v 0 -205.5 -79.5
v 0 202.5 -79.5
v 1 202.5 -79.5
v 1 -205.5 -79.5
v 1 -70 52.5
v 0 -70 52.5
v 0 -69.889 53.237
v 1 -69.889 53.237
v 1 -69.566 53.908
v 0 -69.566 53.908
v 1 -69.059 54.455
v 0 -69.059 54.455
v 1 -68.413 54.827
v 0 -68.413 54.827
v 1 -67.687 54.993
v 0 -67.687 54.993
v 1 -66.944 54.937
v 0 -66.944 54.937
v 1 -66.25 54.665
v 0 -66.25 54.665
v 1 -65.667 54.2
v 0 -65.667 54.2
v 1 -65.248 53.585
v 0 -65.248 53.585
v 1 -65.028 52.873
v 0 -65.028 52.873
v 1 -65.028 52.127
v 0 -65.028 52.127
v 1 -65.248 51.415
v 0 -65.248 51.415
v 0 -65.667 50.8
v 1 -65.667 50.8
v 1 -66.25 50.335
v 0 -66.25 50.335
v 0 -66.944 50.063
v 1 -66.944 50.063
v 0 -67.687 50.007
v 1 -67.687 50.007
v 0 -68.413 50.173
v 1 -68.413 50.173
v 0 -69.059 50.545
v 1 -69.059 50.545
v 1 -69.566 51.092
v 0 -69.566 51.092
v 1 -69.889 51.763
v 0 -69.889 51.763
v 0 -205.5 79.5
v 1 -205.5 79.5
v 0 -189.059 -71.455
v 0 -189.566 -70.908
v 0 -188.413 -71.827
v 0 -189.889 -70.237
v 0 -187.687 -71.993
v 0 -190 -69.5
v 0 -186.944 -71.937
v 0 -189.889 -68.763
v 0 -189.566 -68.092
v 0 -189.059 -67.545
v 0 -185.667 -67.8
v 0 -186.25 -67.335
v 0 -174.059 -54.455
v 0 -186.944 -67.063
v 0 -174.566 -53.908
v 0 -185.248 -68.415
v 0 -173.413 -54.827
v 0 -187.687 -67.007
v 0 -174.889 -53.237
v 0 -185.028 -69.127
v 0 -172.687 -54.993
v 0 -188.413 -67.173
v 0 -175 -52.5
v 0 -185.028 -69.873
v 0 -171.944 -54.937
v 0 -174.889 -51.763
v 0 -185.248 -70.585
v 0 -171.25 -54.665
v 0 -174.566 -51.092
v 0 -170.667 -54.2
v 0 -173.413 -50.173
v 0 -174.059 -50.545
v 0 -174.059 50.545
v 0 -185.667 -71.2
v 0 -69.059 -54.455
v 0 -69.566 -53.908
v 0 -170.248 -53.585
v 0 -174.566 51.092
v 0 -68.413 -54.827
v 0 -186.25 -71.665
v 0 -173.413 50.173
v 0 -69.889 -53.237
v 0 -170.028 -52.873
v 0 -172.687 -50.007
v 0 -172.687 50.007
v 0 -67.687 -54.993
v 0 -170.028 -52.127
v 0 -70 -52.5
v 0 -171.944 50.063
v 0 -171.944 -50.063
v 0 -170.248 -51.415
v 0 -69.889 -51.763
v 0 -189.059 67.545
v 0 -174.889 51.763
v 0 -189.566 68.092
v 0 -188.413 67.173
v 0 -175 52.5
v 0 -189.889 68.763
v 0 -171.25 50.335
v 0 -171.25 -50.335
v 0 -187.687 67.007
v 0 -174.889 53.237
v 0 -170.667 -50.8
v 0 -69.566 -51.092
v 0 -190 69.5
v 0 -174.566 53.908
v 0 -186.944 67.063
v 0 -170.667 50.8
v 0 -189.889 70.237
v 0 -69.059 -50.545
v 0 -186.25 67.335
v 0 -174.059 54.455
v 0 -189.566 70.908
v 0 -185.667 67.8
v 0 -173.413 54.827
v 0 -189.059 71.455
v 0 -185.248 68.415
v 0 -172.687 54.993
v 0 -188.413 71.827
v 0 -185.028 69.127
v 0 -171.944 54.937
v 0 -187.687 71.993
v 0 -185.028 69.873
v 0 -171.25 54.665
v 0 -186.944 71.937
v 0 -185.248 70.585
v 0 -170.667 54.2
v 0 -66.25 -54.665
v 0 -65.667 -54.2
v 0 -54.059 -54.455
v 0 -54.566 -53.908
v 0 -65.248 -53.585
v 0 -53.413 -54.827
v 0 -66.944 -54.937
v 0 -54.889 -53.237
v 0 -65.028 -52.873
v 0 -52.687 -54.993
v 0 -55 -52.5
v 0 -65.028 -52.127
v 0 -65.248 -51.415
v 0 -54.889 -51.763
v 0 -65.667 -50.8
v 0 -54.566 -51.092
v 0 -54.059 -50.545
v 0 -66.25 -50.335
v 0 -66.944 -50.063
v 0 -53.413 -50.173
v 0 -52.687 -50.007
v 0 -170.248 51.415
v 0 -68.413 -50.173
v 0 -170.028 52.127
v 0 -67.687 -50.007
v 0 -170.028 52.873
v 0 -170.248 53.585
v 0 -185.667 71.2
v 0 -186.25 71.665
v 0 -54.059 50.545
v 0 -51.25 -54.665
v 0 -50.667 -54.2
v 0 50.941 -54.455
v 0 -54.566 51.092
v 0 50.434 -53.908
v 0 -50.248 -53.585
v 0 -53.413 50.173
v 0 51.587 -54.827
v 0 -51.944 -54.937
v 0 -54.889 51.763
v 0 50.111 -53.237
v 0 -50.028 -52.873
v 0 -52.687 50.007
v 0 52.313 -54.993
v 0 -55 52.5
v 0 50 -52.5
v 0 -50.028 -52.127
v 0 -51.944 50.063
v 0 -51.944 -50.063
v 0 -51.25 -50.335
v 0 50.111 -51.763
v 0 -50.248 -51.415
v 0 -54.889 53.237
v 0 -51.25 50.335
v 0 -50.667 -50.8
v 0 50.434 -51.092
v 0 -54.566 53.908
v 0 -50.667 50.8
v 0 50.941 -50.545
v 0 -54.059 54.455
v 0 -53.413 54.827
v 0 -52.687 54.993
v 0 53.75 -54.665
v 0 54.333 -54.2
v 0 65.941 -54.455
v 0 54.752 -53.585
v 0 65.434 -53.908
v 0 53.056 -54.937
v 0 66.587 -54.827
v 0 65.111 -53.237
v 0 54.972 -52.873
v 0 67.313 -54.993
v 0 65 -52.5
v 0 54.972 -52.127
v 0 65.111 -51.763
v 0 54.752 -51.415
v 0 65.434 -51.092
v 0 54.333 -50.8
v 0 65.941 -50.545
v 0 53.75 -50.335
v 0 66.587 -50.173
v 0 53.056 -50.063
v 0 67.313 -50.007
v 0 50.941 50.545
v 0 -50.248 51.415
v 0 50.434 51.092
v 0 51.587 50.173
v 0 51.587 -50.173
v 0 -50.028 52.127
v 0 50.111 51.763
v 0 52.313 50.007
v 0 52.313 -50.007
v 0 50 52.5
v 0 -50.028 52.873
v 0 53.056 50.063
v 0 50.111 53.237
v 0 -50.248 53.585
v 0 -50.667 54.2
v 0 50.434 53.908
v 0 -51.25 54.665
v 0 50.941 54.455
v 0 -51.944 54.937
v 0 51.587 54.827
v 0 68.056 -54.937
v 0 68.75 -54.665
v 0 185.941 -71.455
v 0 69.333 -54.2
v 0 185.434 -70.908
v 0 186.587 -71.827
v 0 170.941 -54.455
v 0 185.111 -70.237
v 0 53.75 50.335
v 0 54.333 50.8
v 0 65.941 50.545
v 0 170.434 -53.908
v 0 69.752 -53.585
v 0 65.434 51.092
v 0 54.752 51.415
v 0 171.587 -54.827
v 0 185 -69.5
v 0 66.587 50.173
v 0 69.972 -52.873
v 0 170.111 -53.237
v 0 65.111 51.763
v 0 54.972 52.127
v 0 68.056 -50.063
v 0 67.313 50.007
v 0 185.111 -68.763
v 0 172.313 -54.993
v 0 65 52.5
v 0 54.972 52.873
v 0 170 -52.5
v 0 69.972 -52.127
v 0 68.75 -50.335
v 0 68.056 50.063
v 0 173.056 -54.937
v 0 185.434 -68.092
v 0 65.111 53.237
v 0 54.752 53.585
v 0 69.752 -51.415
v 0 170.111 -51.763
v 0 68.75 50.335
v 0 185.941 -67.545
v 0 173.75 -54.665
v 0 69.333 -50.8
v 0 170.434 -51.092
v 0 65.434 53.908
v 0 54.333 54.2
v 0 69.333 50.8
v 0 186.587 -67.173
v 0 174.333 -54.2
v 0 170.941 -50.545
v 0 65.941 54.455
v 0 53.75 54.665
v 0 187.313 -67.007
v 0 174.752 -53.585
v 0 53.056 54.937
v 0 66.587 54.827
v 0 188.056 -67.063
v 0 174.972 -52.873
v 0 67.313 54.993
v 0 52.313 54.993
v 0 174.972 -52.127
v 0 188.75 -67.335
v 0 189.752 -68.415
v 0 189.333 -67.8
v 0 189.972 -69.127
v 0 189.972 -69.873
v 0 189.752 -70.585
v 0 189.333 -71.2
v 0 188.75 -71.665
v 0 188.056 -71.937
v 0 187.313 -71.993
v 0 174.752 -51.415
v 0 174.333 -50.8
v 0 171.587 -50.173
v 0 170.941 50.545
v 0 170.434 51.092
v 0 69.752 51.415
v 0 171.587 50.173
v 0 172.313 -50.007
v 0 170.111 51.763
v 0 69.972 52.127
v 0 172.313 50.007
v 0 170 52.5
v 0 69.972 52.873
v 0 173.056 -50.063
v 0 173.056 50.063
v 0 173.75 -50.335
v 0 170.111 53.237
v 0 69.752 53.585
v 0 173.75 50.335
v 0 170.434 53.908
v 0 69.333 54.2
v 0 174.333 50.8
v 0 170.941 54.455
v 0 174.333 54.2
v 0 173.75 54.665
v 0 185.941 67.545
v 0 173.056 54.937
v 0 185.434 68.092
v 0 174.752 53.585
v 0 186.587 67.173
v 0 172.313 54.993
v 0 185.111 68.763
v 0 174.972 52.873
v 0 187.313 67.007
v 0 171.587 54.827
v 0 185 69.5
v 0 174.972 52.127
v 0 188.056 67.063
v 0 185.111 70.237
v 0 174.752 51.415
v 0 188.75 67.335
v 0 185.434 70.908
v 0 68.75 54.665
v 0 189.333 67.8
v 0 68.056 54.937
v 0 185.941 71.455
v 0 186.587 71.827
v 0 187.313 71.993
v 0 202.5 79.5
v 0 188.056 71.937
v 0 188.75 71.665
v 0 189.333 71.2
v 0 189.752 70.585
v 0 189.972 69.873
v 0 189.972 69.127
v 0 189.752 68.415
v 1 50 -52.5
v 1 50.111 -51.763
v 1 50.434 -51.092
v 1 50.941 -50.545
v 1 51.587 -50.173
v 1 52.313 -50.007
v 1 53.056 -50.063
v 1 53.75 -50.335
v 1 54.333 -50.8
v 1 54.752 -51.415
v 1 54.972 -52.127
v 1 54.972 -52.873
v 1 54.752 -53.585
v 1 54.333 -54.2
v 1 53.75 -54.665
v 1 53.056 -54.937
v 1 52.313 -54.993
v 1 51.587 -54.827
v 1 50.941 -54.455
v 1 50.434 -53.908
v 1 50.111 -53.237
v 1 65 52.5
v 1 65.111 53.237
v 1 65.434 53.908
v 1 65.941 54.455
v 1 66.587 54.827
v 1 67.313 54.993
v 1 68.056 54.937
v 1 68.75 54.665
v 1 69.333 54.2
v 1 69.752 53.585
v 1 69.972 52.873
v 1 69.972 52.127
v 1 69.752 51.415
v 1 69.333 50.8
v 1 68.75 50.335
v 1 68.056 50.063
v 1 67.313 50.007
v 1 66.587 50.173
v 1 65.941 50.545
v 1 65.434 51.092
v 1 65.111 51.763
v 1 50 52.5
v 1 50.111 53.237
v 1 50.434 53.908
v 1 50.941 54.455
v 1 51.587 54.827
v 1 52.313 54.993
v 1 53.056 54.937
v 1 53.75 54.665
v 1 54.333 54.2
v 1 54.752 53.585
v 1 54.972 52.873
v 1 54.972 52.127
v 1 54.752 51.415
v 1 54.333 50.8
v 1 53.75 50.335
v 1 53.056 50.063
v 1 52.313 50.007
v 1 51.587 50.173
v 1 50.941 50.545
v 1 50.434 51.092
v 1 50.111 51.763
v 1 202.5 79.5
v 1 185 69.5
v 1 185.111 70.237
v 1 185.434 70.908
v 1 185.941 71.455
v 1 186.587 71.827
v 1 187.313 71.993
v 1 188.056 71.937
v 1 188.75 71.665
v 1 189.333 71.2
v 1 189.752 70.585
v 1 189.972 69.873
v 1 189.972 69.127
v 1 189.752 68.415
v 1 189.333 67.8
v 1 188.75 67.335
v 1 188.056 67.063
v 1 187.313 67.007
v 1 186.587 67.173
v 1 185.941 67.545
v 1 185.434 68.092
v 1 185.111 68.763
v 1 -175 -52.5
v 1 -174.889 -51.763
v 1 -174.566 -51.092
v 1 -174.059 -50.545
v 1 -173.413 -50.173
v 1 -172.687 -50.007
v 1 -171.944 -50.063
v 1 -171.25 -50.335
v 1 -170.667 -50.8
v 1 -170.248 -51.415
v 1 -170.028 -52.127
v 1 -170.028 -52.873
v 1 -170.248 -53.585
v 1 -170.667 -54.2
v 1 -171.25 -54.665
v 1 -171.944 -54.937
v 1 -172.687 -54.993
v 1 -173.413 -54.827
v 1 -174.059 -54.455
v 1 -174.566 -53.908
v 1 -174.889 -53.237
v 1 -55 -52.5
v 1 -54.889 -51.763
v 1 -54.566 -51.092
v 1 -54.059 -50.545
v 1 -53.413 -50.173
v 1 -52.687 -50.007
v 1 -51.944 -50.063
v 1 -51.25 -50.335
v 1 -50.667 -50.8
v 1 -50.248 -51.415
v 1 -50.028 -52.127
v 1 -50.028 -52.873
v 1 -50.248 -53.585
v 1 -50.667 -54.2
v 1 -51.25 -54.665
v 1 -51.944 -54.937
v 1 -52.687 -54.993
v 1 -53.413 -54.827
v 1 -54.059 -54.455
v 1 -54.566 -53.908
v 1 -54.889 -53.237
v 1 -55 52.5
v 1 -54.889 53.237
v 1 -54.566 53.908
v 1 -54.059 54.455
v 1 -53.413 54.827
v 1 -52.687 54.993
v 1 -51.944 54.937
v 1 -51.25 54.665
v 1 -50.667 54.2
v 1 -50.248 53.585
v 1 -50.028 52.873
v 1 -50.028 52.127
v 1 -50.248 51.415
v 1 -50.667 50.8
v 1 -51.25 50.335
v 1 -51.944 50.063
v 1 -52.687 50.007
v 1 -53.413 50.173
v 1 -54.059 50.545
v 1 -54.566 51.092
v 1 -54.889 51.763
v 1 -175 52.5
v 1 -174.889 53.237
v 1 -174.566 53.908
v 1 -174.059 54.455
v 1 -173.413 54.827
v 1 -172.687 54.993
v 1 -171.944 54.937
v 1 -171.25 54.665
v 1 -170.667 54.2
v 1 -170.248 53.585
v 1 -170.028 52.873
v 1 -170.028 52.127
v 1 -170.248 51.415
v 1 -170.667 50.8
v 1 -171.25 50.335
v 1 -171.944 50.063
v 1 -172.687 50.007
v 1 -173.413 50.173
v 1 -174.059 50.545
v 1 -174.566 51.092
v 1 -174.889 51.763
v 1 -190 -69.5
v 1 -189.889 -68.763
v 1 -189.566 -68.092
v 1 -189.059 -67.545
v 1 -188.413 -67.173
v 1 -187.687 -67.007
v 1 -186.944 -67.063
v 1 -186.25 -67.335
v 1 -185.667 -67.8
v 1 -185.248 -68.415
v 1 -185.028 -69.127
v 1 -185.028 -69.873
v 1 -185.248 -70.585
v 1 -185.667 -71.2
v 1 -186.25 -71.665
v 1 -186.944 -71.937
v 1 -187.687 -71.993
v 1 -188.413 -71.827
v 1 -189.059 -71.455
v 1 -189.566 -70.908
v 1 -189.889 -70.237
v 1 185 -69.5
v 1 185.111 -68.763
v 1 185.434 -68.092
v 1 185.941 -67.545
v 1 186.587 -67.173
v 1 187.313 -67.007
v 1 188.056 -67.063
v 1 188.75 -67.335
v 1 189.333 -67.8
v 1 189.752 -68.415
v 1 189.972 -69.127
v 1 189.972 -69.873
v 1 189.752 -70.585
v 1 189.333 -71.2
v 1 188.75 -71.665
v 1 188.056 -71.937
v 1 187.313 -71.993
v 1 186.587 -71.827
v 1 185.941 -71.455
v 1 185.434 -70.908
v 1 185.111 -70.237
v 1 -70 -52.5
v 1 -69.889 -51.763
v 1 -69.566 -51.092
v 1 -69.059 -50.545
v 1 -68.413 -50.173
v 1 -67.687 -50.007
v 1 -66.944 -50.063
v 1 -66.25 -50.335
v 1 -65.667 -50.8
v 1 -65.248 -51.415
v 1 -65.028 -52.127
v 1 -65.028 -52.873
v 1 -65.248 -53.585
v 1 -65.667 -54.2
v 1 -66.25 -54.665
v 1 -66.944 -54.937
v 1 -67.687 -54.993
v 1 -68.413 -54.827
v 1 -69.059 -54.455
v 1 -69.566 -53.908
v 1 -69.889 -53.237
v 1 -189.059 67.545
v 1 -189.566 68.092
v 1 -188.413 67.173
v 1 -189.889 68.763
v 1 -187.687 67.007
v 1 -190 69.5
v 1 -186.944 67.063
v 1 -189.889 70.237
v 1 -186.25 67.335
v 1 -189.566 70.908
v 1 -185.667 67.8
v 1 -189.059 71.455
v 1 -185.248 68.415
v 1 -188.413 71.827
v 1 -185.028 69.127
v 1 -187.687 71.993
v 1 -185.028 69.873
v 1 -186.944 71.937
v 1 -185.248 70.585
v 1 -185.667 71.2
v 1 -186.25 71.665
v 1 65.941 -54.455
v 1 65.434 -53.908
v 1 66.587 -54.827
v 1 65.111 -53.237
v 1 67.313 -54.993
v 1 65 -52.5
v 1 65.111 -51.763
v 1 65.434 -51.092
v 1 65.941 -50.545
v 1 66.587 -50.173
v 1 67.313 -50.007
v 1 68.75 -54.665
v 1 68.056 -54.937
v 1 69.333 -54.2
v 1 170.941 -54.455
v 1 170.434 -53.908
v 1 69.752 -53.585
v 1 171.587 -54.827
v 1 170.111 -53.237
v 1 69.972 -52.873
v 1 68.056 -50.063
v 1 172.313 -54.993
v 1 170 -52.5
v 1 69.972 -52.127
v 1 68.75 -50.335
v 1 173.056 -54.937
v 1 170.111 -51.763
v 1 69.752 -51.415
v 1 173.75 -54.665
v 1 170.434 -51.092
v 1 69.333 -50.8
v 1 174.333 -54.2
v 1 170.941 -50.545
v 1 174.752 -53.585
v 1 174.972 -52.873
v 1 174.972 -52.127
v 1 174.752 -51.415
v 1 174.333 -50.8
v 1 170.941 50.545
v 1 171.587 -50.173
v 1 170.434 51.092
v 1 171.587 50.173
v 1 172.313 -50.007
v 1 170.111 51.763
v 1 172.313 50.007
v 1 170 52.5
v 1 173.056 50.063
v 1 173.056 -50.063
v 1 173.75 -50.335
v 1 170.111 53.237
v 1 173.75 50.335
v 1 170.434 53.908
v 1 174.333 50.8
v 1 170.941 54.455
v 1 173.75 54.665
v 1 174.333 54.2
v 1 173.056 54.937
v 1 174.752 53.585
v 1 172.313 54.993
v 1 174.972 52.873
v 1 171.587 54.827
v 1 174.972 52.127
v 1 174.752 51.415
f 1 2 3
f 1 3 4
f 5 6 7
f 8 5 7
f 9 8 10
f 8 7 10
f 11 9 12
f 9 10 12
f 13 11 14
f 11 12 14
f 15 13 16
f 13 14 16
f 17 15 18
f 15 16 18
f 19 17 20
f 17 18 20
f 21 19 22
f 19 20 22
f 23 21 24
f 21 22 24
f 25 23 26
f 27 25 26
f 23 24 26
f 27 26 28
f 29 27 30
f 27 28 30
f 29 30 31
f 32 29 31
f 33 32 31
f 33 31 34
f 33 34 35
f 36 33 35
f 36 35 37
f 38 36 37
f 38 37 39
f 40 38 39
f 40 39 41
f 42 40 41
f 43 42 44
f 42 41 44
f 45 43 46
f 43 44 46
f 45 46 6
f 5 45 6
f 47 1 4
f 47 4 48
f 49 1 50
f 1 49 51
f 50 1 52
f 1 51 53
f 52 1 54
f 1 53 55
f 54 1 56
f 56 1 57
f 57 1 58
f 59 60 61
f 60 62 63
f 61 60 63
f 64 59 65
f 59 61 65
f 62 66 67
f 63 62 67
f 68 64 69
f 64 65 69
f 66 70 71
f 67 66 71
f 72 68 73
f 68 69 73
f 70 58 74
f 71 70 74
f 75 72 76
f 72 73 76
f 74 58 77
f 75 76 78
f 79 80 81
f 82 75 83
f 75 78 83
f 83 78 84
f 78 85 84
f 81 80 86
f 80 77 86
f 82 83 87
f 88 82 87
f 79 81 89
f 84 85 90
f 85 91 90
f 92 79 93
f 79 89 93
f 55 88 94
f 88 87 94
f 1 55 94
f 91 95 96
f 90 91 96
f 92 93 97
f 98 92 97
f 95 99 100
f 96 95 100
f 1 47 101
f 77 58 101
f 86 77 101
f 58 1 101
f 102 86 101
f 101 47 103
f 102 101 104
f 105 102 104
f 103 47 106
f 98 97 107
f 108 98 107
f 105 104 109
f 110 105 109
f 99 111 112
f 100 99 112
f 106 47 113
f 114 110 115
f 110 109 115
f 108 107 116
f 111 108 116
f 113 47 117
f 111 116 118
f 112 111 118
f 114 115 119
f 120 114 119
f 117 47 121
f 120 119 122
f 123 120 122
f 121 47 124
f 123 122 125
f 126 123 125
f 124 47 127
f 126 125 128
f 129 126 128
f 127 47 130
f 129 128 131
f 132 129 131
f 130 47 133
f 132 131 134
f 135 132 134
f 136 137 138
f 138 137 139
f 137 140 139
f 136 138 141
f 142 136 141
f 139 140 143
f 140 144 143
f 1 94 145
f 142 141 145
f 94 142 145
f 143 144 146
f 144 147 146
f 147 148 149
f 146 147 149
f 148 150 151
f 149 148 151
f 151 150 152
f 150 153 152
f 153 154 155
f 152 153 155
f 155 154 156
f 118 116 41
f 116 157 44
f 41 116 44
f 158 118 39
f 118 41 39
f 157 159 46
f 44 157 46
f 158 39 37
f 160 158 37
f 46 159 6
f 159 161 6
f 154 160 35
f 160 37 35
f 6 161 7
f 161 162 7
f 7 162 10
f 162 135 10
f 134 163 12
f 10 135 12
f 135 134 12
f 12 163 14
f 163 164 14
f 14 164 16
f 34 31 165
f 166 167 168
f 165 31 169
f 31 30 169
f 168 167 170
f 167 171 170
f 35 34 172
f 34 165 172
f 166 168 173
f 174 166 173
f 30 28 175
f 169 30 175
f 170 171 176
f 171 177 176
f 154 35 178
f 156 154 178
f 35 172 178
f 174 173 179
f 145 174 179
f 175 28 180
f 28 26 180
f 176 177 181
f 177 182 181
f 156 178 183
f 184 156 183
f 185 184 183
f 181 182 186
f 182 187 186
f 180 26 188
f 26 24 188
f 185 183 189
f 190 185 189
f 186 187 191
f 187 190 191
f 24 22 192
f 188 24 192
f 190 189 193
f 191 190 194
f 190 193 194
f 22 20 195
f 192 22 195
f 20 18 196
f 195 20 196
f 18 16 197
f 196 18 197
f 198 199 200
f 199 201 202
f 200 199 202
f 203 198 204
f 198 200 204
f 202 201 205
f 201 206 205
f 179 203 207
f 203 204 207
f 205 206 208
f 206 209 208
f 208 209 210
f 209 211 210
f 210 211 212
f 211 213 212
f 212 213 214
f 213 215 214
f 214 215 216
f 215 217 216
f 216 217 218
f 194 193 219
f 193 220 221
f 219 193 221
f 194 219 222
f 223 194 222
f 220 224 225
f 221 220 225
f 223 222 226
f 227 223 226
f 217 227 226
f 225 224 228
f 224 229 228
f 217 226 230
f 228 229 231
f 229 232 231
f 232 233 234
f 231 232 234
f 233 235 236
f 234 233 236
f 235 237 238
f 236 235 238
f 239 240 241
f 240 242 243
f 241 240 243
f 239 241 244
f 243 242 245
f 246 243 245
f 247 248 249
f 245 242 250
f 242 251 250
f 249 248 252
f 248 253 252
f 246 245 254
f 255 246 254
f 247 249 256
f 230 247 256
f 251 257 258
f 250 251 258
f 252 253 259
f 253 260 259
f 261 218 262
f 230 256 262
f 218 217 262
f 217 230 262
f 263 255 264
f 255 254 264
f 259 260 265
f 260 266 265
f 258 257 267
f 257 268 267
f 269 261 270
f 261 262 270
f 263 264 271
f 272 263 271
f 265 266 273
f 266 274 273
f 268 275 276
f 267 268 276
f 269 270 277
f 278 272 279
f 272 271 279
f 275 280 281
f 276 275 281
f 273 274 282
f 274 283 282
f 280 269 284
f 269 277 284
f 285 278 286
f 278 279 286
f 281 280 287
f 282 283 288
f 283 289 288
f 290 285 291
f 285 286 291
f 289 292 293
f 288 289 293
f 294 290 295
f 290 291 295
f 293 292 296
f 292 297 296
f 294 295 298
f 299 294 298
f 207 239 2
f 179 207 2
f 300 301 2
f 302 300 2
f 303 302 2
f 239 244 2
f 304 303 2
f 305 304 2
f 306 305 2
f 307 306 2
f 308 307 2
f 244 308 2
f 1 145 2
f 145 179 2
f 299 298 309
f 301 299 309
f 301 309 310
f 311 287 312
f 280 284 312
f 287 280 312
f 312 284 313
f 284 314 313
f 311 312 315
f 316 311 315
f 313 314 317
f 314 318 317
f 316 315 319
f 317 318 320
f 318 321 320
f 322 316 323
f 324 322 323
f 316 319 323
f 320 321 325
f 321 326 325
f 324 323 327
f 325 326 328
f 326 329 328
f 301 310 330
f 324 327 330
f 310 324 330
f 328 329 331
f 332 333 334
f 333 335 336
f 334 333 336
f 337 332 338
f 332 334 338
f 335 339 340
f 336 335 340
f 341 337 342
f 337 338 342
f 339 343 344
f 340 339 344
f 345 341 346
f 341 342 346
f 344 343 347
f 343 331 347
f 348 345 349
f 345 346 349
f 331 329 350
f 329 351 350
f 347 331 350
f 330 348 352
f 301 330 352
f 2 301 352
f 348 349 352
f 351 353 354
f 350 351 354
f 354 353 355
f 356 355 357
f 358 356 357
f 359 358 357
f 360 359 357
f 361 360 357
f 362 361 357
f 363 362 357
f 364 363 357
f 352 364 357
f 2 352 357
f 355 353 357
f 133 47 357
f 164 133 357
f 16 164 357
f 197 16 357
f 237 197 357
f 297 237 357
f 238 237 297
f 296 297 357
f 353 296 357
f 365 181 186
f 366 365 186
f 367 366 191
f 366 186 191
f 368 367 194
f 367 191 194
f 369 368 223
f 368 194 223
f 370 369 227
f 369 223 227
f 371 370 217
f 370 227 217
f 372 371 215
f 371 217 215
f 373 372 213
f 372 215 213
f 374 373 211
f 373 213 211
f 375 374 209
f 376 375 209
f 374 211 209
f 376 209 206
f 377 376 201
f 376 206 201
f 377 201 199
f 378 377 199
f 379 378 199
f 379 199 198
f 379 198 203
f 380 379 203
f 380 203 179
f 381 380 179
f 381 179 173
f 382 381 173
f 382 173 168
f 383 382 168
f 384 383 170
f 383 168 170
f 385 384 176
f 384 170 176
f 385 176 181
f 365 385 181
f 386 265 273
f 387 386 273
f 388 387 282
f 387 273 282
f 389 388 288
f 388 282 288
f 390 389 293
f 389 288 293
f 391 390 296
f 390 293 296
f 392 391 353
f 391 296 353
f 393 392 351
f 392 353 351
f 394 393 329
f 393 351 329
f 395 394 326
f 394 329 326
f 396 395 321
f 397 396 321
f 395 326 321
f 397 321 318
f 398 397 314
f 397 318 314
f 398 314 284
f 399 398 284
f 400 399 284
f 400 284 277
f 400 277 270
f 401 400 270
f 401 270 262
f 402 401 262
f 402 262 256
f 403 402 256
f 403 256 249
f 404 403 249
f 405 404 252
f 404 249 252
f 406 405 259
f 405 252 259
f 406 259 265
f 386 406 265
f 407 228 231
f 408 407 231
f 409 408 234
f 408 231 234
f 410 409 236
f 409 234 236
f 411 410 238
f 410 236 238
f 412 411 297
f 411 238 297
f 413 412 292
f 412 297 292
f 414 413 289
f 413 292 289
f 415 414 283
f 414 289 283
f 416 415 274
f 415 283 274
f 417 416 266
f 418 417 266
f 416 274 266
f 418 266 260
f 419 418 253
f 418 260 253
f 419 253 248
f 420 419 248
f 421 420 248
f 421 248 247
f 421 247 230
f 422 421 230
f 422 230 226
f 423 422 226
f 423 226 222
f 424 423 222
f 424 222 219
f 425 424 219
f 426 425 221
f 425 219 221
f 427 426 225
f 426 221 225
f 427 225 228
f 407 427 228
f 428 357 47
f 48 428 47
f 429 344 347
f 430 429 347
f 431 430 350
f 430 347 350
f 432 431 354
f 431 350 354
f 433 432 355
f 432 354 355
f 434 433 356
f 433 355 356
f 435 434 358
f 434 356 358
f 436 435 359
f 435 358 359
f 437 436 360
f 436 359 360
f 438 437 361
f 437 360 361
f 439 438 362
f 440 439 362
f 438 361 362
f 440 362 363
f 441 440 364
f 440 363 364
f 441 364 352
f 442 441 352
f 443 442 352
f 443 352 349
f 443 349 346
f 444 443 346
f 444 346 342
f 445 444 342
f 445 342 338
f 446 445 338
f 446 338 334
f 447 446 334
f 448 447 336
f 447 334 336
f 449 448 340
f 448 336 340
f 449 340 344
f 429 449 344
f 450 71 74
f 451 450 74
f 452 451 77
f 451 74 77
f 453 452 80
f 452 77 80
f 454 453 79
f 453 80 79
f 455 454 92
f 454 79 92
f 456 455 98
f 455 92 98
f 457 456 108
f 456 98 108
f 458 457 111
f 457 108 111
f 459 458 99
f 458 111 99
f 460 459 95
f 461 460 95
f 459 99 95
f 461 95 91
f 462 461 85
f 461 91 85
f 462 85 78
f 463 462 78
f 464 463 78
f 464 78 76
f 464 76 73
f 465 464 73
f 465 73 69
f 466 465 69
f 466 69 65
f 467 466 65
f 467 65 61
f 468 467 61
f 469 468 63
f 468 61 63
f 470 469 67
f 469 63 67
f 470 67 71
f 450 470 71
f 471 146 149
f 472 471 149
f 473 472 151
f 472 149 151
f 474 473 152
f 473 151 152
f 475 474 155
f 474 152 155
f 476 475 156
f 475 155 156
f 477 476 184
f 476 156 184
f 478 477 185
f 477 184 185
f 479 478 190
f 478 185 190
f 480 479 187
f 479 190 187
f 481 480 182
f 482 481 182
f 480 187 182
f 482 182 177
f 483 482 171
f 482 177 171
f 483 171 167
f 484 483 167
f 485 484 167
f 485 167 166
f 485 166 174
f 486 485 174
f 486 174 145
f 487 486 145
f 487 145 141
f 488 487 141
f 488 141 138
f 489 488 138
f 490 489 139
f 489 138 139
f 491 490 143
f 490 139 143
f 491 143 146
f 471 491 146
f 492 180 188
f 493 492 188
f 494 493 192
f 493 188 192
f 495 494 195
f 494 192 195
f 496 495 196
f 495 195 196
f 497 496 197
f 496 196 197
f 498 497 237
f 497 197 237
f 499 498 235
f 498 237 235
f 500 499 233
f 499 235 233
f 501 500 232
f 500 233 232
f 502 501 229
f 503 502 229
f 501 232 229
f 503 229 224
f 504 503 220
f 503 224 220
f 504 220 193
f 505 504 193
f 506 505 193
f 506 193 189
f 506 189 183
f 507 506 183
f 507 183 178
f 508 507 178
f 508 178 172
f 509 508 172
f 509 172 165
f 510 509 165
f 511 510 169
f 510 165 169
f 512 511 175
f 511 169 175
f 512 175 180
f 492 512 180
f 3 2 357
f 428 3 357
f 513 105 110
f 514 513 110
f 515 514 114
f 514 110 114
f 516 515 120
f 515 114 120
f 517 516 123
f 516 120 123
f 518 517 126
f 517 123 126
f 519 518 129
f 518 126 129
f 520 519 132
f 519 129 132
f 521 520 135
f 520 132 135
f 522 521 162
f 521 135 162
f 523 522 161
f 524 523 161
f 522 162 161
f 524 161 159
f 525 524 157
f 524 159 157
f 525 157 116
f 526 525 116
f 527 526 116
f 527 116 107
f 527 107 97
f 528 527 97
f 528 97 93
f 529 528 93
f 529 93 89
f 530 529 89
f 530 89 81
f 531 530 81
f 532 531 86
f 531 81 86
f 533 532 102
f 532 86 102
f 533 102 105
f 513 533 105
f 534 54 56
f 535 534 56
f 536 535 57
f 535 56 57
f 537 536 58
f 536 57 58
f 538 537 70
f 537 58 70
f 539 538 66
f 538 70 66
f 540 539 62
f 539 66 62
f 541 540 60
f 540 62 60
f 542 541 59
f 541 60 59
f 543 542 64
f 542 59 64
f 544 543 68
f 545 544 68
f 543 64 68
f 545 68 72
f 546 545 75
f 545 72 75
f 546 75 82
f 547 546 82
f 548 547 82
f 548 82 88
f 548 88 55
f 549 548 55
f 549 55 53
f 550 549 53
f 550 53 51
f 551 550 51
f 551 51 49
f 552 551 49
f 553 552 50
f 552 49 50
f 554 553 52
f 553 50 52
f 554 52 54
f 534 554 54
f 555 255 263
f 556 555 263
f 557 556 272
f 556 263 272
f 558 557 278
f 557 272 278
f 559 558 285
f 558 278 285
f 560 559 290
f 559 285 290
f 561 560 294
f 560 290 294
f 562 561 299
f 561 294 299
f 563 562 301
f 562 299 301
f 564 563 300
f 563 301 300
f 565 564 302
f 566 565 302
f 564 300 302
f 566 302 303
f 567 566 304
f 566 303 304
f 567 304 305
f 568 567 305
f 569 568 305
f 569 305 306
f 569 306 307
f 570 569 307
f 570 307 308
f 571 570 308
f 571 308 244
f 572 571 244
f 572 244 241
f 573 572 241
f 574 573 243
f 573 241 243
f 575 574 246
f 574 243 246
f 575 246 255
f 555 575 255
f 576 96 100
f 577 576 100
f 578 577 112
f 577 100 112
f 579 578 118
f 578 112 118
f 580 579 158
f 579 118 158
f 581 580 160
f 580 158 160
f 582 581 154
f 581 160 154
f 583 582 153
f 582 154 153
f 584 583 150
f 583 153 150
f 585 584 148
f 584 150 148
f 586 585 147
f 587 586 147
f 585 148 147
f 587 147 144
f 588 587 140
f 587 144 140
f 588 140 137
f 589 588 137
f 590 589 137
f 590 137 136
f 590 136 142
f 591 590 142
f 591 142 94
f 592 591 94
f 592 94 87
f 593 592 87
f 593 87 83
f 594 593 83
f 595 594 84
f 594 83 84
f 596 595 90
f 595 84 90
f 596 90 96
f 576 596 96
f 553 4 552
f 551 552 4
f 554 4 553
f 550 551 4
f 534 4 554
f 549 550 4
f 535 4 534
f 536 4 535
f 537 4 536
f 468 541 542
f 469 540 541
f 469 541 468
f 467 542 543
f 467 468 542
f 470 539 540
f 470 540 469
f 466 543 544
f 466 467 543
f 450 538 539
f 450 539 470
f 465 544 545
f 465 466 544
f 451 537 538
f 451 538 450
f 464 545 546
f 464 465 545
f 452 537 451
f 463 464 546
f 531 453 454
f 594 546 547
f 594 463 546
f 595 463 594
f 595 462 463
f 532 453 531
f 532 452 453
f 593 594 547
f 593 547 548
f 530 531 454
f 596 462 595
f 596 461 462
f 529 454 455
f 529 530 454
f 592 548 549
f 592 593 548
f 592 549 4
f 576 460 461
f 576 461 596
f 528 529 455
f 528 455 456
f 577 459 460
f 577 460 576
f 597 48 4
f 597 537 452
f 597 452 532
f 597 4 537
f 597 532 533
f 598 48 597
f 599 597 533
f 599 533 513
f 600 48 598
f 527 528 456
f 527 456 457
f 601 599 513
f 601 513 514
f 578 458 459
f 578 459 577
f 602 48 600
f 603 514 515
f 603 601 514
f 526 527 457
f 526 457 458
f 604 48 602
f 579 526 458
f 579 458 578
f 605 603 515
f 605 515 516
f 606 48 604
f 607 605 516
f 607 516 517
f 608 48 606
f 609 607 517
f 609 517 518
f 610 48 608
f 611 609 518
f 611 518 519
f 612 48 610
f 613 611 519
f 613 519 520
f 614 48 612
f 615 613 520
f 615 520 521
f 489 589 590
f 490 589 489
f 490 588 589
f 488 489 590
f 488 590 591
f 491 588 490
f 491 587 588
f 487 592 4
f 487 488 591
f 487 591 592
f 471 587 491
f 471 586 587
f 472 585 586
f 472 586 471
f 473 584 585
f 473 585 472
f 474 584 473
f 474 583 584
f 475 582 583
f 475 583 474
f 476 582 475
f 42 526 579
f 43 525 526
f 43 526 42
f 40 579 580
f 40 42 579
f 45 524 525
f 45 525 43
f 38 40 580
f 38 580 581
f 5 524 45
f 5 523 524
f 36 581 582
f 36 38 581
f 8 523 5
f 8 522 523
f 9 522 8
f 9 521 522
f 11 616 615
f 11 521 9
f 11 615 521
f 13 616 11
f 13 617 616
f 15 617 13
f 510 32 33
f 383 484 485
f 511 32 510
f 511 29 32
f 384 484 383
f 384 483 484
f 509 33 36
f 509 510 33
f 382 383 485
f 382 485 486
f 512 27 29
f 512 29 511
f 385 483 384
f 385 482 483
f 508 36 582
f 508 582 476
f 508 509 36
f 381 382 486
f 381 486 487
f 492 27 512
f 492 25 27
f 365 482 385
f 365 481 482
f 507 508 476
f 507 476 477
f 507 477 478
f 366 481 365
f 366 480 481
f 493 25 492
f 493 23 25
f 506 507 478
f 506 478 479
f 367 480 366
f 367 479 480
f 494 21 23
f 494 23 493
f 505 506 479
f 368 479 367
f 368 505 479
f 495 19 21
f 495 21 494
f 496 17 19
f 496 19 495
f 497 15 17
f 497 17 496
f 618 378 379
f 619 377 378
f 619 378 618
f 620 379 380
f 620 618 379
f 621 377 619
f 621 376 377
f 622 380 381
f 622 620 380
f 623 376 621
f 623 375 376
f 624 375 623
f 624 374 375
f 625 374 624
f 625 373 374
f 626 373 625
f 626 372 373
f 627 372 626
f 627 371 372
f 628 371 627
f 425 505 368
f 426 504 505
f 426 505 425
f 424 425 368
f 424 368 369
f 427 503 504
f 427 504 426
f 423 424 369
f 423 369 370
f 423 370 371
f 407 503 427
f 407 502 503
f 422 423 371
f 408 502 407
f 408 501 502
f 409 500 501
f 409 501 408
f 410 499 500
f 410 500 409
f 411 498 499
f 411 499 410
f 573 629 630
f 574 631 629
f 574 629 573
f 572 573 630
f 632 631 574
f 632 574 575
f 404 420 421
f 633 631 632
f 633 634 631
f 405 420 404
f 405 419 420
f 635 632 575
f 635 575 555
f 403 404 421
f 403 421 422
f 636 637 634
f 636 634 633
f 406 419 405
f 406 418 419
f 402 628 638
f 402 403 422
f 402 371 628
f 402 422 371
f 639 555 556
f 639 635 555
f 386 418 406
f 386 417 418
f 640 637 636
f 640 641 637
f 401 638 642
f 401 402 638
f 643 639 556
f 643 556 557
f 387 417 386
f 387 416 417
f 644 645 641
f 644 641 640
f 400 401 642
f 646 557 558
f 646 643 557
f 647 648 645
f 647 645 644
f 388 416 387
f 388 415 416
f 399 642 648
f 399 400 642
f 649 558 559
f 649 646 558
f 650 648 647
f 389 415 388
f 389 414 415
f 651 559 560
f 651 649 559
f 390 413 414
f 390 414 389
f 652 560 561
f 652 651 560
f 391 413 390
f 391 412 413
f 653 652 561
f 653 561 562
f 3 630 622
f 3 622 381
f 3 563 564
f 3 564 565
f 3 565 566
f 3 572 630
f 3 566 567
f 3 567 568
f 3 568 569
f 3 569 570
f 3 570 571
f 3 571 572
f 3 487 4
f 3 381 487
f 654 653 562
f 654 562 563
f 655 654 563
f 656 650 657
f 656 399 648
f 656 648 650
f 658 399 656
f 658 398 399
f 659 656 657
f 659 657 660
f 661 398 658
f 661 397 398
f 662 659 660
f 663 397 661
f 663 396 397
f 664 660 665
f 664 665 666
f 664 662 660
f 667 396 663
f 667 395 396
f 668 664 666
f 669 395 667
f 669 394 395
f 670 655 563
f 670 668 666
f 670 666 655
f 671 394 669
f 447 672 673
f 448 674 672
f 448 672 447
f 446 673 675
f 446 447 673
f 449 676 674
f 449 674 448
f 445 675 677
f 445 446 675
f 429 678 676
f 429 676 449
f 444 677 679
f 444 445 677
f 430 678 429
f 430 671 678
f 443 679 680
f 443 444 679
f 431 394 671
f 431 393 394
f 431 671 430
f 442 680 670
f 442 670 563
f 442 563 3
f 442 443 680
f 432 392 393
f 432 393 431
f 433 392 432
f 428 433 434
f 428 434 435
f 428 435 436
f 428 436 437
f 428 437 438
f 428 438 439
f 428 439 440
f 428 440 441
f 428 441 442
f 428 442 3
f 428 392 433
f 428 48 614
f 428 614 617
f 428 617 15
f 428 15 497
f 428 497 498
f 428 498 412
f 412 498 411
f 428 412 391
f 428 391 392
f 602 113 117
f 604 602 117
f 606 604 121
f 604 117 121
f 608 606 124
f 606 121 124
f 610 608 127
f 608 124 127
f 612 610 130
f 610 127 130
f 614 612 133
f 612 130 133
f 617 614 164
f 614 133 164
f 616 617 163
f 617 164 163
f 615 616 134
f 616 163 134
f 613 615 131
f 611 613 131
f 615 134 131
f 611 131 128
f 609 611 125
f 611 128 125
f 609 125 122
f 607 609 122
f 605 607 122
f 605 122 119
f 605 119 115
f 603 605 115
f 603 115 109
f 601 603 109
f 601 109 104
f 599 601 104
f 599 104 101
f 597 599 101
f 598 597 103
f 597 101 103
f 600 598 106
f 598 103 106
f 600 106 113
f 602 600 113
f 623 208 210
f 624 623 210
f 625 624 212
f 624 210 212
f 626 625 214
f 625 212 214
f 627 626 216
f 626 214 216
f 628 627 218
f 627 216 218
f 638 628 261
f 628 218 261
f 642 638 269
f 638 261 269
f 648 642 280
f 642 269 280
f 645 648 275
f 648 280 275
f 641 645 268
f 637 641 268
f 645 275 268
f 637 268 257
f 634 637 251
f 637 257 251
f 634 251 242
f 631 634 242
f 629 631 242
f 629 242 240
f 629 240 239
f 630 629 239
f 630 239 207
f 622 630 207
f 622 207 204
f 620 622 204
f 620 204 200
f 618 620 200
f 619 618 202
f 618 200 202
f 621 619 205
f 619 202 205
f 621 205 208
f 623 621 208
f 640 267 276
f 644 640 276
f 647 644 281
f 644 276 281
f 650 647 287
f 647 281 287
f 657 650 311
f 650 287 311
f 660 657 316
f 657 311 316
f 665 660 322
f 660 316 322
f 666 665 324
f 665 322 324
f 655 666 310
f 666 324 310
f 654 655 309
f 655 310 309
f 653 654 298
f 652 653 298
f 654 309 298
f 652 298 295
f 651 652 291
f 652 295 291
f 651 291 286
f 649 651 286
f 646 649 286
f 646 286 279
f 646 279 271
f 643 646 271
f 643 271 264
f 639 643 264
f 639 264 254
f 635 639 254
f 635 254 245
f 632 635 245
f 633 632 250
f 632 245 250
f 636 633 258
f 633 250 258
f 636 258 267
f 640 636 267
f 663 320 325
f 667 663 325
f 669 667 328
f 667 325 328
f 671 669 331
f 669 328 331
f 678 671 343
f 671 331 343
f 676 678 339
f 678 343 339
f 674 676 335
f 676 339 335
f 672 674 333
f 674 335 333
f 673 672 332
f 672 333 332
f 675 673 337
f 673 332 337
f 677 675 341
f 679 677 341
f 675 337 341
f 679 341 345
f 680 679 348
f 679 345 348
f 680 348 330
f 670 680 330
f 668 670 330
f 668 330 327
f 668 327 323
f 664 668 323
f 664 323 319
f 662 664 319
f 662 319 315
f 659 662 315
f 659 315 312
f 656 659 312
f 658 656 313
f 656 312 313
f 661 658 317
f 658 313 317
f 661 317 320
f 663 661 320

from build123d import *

# Parameters (mm, degrees)
F0_W      = 415
F0_H      = 169
F1_DEPTH  = 24
F2_W      = 413
F2_H      = 167
F3_DEPTH  = 23
F5_DEPTH  = 415.001
F6_R      = 1.5
F7_DEPTH  = 415.001
F8_R      = 2.5
F9_DEPTH  = 1
F10_W     = 408
F10_H     = 159
F11_DEPTH = 24.001
F12_R     = 2.5
F13_DEPTH = 1


with BuildPart() as f1:
    # F0 (on Right) → F1 (new body)
    with BuildSketch(Plane.YZ):
        Rectangle(F0_W, F0_H)
    extrude(amount=F1_DEPTH)

    # F2 (on face) → F3 (cut)
    with BuildSketch(Plane.YZ.offset(24)):
        Rectangle(F2_W, F2_H)
    extrude(amount=-F3_DEPTH, mode=Mode.SUBTRACT)

    # F4 (on face) → F5 (cut, through all)
    with BuildSketch(Plane.XZ.offset(207.5)):
        with BuildLine():
            Line((8, -83.5), (24, -83.5))
            Line((24, -83.5), (24, -75.5))
            Line((24, -75.5), (19.5, -77.5))
            Line((19.5, -77.5), (18, -76.5))
            Line((18, -76.5), (18, -64.5))
            ThreePointArc((18, -64.5), (13, -59.5), (8, -64.5))
            Line((8, -64.5), (8, -83.5))
        make_face()
        with BuildLine():
            Line((18, 64.5), (18, 76.5))
            Line((18, 76.5), (19.5, 77.5))
            Line((19.5, 77.5), (24, 75.5))
            Line((24, 75.5), (24, 83.5))
            Line((24, 83.5), (8, 83.5))
            Line((8, 83.5), (8, 64.5))
            ThreePointArc((8, 64.5), (13, 59.5), (18, 64.5))
        make_face()
    extrude(amount=-F5_DEPTH, mode=Mode.SUBTRACT)

    # F6 (on face) → F7 (cut, through all)
    with BuildSketch(Plane.XZ.offset(207.5)):
        with Locations((12.5, 50.5)):
            Circle(F6_R)
    extrude(amount=-F7_DEPTH, mode=Mode.SUBTRACT)

    # F8 (on face) → F9 (cut, through all)
    with BuildSketch(Plane(origin=(0, 0, 0), x_dir=(0, -1, 0), z_dir=(-1, 0, 0))):
        with Locations((-172.5, 52.5)):
            Circle(F8_R)
        with Locations((-67.5, 52.5)):
            Circle(F8_R)
        with Locations((-52.5, 52.5)):
            Circle(F8_R)
        with Locations((-67.5, -52.5)):
            Circle(F8_R)
        with Locations((-172.5, -52.5)):
            Circle(F8_R)
        with Locations((-52.5, -52.5)):
            Circle(F8_R)
        with Locations((67.5, -52.5)):
            Circle(F8_R)
        with Locations((52.5, 52.5)):
            Circle(F8_R)
        with Locations((67.5, 52.5)):
            Circle(F8_R)
        with Locations((172.5, 52.5)):
            Circle(F8_R)
        with Locations((172.5, -52.5)):
            Circle(F8_R)
        with Locations((52.5, -52.5)):
            Circle(F8_R)
    extrude(amount=-F9_DEPTH, mode=Mode.SUBTRACT)

    # F10 (on face) → F11 (cut, through all)
    with BuildSketch(Plane(origin=(0, 0, 0), x_dir=(0, -1, 0), z_dir=(-1, 0, 0))):
        Polygon((207.5, 84.5), (-207.5, 84.5), (-207.5, 79.5), (-207.5, -79.5), (-207.5, -84.5), (207.5, -84.5), (207.5, -79.5), (207.5, 79.5), align=None)
        with Locations((1.5, 0)):
            Rectangle(F10_W, F10_H, mode=Mode.SUBTRACT)
    extrude(amount=-F11_DEPTH, mode=Mode.SUBTRACT)

    # F12 (on face) → F13 (cut, through all)
    with BuildSketch(Plane(origin=(0, 0, 0), x_dir=(0, -1, 0), z_dir=(-1, 0, 0))):
        with Locations((-187.5, 69.5)):
            Circle(F12_R)
        with Locations((-187.5, -69.5)):
            Circle(F12_R)
        with Locations((187.5, 69.5)):
            Circle(F12_R)
        with Locations((187.5, -69.5)):
            Circle(F12_R)
    extrude(amount=-F13_DEPTH, mode=Mode.SUBTRACT)


solid = f1.part
